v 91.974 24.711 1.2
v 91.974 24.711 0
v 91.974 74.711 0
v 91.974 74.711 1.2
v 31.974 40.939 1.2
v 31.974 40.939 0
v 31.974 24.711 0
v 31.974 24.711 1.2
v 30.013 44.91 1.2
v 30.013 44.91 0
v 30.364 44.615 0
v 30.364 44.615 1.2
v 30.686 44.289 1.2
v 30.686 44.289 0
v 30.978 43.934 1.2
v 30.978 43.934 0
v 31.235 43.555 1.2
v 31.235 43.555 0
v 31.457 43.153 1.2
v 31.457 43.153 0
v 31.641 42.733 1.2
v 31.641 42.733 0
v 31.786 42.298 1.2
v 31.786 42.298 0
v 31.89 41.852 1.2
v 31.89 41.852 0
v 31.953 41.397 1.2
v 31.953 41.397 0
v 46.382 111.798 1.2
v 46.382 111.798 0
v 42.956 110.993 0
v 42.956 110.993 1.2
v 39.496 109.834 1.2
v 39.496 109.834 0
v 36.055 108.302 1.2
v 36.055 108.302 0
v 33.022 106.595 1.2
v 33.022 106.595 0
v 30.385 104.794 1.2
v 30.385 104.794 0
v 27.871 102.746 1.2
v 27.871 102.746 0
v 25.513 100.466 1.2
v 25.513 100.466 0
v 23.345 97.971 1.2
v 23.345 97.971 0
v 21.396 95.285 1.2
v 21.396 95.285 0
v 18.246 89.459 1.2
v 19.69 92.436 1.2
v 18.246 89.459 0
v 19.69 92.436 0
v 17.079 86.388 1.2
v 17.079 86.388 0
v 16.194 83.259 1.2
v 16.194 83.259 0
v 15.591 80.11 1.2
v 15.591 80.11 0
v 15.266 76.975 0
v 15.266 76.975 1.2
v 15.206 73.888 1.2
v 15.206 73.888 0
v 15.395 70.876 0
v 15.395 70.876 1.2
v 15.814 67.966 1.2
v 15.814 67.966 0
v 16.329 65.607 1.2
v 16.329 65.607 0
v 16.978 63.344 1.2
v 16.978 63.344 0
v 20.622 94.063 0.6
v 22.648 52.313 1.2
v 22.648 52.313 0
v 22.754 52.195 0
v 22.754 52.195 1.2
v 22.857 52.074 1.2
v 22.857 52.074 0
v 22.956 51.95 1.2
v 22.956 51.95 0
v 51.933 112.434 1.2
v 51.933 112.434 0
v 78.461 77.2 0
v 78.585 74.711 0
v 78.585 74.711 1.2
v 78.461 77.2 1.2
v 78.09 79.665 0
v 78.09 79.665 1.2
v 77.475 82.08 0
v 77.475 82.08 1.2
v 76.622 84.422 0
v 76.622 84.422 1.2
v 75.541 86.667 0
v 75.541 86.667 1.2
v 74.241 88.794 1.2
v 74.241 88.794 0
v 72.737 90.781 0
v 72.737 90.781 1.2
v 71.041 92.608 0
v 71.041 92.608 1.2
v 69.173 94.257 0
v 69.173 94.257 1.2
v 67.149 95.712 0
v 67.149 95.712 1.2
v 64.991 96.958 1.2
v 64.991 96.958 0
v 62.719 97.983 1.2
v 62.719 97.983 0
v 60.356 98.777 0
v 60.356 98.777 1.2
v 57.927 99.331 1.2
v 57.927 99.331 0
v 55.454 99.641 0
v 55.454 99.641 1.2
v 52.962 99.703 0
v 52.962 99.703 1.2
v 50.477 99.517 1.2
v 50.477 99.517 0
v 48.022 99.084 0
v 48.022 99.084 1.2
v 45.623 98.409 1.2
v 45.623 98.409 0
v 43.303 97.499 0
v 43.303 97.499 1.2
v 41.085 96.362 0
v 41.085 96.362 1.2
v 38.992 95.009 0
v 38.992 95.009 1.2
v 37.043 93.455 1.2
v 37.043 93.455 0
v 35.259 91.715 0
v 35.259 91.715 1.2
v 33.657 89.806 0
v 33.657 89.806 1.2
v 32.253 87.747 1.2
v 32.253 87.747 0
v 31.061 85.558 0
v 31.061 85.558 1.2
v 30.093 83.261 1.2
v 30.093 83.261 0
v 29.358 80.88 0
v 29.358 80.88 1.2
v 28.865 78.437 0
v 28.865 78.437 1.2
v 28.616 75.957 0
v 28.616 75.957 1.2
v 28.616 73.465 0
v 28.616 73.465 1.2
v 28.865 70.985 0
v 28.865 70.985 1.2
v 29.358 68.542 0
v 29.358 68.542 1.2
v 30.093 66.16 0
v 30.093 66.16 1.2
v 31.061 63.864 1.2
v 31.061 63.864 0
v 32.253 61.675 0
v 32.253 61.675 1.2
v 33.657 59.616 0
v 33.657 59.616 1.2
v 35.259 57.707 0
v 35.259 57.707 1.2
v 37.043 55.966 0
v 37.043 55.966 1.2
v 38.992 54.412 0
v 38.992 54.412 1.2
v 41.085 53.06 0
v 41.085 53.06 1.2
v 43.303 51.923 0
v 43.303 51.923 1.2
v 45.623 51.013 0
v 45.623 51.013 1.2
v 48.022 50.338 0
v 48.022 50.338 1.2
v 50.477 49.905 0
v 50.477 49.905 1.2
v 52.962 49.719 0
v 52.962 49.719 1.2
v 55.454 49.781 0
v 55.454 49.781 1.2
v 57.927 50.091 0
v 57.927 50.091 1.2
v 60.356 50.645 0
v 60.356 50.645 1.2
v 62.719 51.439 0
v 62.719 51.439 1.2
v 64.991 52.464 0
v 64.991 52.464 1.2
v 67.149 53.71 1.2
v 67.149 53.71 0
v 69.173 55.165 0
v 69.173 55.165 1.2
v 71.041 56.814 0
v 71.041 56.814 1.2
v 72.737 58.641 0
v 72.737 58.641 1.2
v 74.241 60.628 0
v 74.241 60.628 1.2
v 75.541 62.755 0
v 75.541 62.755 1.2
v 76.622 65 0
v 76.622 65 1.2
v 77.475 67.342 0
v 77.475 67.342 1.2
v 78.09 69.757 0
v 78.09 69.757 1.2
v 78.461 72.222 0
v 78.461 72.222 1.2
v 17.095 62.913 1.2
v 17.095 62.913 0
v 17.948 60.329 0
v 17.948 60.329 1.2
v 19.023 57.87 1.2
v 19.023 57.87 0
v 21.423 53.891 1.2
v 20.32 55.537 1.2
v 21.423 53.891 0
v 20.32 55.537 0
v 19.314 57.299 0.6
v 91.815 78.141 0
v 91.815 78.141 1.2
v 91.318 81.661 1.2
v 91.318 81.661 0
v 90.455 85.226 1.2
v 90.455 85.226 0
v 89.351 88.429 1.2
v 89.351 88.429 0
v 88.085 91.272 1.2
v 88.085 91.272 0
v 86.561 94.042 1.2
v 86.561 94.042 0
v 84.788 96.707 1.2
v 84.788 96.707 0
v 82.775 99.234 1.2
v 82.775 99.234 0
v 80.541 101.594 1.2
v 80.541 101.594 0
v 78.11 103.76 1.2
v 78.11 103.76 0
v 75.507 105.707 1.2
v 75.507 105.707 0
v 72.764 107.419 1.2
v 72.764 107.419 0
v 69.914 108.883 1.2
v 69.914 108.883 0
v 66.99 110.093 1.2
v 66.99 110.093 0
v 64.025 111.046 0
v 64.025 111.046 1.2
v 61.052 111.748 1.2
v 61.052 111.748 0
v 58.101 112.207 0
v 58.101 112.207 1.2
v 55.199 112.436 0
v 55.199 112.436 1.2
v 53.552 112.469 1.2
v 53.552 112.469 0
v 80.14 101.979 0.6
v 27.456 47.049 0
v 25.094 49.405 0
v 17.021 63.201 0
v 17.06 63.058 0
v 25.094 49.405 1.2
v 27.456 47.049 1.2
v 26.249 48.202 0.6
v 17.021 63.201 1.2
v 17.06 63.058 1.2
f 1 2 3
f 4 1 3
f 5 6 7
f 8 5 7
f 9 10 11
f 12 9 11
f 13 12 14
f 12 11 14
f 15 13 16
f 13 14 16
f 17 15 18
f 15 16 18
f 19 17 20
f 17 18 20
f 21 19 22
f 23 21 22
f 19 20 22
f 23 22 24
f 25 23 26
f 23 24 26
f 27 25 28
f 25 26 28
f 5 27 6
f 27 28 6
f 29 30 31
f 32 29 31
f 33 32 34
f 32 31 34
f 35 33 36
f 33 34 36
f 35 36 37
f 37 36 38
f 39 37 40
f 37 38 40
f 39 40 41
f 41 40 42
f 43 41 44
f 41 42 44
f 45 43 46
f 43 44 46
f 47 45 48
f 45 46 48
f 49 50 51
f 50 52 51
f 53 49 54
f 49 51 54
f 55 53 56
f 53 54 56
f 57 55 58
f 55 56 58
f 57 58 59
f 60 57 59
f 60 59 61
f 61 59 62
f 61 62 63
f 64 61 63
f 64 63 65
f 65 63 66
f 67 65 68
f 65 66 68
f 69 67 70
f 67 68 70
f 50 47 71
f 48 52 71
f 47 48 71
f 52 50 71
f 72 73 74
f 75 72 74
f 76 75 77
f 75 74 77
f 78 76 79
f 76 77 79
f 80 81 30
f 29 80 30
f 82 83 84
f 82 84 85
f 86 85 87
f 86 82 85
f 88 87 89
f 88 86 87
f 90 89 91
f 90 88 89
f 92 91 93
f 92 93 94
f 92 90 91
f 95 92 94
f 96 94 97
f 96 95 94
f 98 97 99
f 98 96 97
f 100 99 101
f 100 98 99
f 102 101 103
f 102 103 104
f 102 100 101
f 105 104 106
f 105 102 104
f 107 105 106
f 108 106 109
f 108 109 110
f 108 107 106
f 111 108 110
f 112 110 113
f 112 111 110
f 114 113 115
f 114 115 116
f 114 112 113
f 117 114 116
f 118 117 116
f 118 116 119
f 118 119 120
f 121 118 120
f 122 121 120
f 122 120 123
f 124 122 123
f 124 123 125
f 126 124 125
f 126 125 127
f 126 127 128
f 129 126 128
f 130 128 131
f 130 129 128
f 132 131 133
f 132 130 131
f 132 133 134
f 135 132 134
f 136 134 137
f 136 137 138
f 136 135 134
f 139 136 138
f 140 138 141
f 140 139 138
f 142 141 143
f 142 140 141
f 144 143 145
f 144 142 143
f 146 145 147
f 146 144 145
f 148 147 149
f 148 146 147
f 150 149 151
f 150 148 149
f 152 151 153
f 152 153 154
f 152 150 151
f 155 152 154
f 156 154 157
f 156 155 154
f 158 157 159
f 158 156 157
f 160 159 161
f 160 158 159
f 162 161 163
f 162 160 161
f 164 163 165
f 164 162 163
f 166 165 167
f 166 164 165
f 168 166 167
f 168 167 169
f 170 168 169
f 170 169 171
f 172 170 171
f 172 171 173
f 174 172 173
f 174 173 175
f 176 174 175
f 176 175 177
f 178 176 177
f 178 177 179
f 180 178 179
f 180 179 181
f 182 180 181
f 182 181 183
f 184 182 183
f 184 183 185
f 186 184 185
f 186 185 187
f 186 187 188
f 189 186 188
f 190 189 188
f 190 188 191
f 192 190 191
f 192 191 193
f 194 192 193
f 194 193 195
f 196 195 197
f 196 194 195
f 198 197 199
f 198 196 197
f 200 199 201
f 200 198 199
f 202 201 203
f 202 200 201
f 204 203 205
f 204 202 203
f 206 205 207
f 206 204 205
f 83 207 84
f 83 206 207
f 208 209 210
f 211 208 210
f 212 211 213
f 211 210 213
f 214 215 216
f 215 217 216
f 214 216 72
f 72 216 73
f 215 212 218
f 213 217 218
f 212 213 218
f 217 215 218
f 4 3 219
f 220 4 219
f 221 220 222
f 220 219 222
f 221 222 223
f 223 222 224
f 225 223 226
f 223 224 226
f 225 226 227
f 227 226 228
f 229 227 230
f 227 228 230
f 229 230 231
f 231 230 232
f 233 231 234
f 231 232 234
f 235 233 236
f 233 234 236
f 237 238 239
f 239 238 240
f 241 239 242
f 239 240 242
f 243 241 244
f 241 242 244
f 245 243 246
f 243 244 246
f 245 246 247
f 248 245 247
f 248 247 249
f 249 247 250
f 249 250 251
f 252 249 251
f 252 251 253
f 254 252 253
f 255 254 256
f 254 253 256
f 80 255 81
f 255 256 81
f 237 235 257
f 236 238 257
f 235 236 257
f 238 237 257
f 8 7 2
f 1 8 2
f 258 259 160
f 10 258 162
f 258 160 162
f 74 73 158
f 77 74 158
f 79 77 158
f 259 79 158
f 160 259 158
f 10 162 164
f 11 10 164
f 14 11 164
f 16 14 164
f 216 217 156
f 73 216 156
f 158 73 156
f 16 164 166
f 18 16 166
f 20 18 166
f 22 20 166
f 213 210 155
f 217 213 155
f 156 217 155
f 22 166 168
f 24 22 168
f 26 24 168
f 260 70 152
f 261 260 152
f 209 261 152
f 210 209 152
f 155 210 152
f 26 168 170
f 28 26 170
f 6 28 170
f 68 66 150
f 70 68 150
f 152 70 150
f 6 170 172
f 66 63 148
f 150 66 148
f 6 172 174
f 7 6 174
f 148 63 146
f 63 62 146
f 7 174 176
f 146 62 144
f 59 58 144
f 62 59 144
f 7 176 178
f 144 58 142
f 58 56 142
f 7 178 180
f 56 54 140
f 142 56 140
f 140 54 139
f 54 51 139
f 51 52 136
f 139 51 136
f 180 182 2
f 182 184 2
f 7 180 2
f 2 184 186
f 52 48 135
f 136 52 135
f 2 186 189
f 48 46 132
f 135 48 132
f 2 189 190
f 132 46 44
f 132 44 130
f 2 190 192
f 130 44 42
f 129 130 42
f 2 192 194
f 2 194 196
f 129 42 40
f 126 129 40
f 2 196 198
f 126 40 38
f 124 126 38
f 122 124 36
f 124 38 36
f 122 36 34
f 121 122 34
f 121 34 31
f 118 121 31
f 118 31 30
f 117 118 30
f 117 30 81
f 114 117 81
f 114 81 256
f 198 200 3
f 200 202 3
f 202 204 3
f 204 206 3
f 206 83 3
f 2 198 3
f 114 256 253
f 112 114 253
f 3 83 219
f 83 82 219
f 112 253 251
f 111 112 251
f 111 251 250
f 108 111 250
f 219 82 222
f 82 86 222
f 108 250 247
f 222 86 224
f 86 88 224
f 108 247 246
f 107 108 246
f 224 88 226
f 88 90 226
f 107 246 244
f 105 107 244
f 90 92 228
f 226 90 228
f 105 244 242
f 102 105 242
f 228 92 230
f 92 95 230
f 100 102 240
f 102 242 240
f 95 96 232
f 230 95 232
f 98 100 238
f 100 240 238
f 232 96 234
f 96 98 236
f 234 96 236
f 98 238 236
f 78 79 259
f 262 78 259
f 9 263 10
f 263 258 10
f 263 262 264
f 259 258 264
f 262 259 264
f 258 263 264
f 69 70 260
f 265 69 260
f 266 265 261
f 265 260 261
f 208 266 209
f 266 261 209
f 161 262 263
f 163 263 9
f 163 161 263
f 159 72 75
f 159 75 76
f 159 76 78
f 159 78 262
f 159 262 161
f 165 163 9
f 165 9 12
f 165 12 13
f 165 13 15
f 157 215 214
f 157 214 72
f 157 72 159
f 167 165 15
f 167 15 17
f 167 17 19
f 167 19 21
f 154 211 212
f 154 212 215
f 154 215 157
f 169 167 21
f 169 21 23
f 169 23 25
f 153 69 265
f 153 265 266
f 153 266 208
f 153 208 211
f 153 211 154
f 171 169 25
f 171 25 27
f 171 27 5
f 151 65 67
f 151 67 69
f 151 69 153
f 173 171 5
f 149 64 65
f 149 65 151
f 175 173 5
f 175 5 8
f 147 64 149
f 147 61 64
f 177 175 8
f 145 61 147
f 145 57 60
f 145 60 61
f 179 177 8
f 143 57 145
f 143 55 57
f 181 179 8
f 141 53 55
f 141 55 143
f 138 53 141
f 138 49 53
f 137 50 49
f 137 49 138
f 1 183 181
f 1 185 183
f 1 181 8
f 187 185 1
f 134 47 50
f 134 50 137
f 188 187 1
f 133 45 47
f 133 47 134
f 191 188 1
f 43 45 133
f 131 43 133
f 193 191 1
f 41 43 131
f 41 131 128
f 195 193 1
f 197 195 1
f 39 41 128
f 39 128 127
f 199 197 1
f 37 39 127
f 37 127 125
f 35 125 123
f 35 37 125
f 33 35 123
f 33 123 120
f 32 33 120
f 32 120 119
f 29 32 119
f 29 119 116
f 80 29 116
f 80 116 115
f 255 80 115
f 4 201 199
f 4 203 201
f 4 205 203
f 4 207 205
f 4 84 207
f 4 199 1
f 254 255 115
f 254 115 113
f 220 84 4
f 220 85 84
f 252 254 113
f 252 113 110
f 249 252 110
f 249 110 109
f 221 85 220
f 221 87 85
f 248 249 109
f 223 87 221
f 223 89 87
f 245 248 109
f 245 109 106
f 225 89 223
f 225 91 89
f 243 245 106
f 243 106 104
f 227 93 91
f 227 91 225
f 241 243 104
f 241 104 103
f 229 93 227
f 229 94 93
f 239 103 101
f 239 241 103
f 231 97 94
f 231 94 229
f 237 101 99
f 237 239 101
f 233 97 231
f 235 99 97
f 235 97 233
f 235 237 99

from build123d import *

# Parameters (mm, degrees)
SKETCH1_R           = 25
BOSS_EXTRUDE2_DEPTH = 1.2


with BuildPart() as part:
    # Sketch1 → Boss-Extrude2 (new body)
    with BuildSketch(Plane.XY):
        with BuildLine():
            ThreePointArc((30.012612552, 44.909806232), (31.456939617, 43.153429969), (31.974033442, 40.939033386))
            Line((31.974033442, 40.939033386), (31.974033442, 24.710911787))
            Line((31.974033442, 24.710911787), (91.973979472, 24.710911787))
            Line((91.973979472, 24.710911787), (91.974010458, 74.710883533))
            add(Edge.make_bspline(
                [(91.974010458, 74.710883533), (91.974034887, 114.130812003), (51.933054654, 112.434101318)],
                knots=[0, 0, 0, 1.61385221, 1.61385221, 1.61385221], degree=2, weights=[1, 0.691721555, 1]))
            Line((51.933054654, 112.434101318), (46.381981502, 111.79839875))
            add(Edge.make_bspline(
                [(46.381981502, 111.79839875), (3.982488462, 103.83150821), (16.977674359, 63.34382334)],
                knots=[4.901152551, 4.901152551, 4.901152551, 6.588978479, 6.588978479, 6.588978479], degree=2, weights=[1, 0.664543961, 1]))
            ThreePointArc((16.977674359, 63.34382334), (17.041173685, 63.129657728), (17.095043921, 62.912869648))
            add(Edge.make_bspline(
                [(17.095043921, 62.912869648), (18.7559158, 56.98560233), (22.647992265, 52.31328285)],
                knots=[0.033678654, 0.033678654, 0.033678654, 0.963651852, 0.963651852, 0.963651852], degree=2))
            ThreePointArc((22.647992265, 52.31328285), (22.806145611, 52.135286834), (22.955645602, 51.949963291))
            add(Edge.make_bspline(
                [(22.955645602, 51.949963291), (26.0115243, 47.971583788), (30.012612552, 44.909806232)],
                knots=[0.647016148, 0.647016148, 0.647016148, 0.90960641, 0.90960641, 0.90960641], degree=2, weights=[1, 0.991393169, 1]))
        make_face()
        with Locations((53.585400153, 74.710911787)):
            Circle(SKETCH1_R, mode=Mode.SUBTRACT)
    extrude(amount=BOSS_EXTRUDE2_DEPTH)


solid = part.part
